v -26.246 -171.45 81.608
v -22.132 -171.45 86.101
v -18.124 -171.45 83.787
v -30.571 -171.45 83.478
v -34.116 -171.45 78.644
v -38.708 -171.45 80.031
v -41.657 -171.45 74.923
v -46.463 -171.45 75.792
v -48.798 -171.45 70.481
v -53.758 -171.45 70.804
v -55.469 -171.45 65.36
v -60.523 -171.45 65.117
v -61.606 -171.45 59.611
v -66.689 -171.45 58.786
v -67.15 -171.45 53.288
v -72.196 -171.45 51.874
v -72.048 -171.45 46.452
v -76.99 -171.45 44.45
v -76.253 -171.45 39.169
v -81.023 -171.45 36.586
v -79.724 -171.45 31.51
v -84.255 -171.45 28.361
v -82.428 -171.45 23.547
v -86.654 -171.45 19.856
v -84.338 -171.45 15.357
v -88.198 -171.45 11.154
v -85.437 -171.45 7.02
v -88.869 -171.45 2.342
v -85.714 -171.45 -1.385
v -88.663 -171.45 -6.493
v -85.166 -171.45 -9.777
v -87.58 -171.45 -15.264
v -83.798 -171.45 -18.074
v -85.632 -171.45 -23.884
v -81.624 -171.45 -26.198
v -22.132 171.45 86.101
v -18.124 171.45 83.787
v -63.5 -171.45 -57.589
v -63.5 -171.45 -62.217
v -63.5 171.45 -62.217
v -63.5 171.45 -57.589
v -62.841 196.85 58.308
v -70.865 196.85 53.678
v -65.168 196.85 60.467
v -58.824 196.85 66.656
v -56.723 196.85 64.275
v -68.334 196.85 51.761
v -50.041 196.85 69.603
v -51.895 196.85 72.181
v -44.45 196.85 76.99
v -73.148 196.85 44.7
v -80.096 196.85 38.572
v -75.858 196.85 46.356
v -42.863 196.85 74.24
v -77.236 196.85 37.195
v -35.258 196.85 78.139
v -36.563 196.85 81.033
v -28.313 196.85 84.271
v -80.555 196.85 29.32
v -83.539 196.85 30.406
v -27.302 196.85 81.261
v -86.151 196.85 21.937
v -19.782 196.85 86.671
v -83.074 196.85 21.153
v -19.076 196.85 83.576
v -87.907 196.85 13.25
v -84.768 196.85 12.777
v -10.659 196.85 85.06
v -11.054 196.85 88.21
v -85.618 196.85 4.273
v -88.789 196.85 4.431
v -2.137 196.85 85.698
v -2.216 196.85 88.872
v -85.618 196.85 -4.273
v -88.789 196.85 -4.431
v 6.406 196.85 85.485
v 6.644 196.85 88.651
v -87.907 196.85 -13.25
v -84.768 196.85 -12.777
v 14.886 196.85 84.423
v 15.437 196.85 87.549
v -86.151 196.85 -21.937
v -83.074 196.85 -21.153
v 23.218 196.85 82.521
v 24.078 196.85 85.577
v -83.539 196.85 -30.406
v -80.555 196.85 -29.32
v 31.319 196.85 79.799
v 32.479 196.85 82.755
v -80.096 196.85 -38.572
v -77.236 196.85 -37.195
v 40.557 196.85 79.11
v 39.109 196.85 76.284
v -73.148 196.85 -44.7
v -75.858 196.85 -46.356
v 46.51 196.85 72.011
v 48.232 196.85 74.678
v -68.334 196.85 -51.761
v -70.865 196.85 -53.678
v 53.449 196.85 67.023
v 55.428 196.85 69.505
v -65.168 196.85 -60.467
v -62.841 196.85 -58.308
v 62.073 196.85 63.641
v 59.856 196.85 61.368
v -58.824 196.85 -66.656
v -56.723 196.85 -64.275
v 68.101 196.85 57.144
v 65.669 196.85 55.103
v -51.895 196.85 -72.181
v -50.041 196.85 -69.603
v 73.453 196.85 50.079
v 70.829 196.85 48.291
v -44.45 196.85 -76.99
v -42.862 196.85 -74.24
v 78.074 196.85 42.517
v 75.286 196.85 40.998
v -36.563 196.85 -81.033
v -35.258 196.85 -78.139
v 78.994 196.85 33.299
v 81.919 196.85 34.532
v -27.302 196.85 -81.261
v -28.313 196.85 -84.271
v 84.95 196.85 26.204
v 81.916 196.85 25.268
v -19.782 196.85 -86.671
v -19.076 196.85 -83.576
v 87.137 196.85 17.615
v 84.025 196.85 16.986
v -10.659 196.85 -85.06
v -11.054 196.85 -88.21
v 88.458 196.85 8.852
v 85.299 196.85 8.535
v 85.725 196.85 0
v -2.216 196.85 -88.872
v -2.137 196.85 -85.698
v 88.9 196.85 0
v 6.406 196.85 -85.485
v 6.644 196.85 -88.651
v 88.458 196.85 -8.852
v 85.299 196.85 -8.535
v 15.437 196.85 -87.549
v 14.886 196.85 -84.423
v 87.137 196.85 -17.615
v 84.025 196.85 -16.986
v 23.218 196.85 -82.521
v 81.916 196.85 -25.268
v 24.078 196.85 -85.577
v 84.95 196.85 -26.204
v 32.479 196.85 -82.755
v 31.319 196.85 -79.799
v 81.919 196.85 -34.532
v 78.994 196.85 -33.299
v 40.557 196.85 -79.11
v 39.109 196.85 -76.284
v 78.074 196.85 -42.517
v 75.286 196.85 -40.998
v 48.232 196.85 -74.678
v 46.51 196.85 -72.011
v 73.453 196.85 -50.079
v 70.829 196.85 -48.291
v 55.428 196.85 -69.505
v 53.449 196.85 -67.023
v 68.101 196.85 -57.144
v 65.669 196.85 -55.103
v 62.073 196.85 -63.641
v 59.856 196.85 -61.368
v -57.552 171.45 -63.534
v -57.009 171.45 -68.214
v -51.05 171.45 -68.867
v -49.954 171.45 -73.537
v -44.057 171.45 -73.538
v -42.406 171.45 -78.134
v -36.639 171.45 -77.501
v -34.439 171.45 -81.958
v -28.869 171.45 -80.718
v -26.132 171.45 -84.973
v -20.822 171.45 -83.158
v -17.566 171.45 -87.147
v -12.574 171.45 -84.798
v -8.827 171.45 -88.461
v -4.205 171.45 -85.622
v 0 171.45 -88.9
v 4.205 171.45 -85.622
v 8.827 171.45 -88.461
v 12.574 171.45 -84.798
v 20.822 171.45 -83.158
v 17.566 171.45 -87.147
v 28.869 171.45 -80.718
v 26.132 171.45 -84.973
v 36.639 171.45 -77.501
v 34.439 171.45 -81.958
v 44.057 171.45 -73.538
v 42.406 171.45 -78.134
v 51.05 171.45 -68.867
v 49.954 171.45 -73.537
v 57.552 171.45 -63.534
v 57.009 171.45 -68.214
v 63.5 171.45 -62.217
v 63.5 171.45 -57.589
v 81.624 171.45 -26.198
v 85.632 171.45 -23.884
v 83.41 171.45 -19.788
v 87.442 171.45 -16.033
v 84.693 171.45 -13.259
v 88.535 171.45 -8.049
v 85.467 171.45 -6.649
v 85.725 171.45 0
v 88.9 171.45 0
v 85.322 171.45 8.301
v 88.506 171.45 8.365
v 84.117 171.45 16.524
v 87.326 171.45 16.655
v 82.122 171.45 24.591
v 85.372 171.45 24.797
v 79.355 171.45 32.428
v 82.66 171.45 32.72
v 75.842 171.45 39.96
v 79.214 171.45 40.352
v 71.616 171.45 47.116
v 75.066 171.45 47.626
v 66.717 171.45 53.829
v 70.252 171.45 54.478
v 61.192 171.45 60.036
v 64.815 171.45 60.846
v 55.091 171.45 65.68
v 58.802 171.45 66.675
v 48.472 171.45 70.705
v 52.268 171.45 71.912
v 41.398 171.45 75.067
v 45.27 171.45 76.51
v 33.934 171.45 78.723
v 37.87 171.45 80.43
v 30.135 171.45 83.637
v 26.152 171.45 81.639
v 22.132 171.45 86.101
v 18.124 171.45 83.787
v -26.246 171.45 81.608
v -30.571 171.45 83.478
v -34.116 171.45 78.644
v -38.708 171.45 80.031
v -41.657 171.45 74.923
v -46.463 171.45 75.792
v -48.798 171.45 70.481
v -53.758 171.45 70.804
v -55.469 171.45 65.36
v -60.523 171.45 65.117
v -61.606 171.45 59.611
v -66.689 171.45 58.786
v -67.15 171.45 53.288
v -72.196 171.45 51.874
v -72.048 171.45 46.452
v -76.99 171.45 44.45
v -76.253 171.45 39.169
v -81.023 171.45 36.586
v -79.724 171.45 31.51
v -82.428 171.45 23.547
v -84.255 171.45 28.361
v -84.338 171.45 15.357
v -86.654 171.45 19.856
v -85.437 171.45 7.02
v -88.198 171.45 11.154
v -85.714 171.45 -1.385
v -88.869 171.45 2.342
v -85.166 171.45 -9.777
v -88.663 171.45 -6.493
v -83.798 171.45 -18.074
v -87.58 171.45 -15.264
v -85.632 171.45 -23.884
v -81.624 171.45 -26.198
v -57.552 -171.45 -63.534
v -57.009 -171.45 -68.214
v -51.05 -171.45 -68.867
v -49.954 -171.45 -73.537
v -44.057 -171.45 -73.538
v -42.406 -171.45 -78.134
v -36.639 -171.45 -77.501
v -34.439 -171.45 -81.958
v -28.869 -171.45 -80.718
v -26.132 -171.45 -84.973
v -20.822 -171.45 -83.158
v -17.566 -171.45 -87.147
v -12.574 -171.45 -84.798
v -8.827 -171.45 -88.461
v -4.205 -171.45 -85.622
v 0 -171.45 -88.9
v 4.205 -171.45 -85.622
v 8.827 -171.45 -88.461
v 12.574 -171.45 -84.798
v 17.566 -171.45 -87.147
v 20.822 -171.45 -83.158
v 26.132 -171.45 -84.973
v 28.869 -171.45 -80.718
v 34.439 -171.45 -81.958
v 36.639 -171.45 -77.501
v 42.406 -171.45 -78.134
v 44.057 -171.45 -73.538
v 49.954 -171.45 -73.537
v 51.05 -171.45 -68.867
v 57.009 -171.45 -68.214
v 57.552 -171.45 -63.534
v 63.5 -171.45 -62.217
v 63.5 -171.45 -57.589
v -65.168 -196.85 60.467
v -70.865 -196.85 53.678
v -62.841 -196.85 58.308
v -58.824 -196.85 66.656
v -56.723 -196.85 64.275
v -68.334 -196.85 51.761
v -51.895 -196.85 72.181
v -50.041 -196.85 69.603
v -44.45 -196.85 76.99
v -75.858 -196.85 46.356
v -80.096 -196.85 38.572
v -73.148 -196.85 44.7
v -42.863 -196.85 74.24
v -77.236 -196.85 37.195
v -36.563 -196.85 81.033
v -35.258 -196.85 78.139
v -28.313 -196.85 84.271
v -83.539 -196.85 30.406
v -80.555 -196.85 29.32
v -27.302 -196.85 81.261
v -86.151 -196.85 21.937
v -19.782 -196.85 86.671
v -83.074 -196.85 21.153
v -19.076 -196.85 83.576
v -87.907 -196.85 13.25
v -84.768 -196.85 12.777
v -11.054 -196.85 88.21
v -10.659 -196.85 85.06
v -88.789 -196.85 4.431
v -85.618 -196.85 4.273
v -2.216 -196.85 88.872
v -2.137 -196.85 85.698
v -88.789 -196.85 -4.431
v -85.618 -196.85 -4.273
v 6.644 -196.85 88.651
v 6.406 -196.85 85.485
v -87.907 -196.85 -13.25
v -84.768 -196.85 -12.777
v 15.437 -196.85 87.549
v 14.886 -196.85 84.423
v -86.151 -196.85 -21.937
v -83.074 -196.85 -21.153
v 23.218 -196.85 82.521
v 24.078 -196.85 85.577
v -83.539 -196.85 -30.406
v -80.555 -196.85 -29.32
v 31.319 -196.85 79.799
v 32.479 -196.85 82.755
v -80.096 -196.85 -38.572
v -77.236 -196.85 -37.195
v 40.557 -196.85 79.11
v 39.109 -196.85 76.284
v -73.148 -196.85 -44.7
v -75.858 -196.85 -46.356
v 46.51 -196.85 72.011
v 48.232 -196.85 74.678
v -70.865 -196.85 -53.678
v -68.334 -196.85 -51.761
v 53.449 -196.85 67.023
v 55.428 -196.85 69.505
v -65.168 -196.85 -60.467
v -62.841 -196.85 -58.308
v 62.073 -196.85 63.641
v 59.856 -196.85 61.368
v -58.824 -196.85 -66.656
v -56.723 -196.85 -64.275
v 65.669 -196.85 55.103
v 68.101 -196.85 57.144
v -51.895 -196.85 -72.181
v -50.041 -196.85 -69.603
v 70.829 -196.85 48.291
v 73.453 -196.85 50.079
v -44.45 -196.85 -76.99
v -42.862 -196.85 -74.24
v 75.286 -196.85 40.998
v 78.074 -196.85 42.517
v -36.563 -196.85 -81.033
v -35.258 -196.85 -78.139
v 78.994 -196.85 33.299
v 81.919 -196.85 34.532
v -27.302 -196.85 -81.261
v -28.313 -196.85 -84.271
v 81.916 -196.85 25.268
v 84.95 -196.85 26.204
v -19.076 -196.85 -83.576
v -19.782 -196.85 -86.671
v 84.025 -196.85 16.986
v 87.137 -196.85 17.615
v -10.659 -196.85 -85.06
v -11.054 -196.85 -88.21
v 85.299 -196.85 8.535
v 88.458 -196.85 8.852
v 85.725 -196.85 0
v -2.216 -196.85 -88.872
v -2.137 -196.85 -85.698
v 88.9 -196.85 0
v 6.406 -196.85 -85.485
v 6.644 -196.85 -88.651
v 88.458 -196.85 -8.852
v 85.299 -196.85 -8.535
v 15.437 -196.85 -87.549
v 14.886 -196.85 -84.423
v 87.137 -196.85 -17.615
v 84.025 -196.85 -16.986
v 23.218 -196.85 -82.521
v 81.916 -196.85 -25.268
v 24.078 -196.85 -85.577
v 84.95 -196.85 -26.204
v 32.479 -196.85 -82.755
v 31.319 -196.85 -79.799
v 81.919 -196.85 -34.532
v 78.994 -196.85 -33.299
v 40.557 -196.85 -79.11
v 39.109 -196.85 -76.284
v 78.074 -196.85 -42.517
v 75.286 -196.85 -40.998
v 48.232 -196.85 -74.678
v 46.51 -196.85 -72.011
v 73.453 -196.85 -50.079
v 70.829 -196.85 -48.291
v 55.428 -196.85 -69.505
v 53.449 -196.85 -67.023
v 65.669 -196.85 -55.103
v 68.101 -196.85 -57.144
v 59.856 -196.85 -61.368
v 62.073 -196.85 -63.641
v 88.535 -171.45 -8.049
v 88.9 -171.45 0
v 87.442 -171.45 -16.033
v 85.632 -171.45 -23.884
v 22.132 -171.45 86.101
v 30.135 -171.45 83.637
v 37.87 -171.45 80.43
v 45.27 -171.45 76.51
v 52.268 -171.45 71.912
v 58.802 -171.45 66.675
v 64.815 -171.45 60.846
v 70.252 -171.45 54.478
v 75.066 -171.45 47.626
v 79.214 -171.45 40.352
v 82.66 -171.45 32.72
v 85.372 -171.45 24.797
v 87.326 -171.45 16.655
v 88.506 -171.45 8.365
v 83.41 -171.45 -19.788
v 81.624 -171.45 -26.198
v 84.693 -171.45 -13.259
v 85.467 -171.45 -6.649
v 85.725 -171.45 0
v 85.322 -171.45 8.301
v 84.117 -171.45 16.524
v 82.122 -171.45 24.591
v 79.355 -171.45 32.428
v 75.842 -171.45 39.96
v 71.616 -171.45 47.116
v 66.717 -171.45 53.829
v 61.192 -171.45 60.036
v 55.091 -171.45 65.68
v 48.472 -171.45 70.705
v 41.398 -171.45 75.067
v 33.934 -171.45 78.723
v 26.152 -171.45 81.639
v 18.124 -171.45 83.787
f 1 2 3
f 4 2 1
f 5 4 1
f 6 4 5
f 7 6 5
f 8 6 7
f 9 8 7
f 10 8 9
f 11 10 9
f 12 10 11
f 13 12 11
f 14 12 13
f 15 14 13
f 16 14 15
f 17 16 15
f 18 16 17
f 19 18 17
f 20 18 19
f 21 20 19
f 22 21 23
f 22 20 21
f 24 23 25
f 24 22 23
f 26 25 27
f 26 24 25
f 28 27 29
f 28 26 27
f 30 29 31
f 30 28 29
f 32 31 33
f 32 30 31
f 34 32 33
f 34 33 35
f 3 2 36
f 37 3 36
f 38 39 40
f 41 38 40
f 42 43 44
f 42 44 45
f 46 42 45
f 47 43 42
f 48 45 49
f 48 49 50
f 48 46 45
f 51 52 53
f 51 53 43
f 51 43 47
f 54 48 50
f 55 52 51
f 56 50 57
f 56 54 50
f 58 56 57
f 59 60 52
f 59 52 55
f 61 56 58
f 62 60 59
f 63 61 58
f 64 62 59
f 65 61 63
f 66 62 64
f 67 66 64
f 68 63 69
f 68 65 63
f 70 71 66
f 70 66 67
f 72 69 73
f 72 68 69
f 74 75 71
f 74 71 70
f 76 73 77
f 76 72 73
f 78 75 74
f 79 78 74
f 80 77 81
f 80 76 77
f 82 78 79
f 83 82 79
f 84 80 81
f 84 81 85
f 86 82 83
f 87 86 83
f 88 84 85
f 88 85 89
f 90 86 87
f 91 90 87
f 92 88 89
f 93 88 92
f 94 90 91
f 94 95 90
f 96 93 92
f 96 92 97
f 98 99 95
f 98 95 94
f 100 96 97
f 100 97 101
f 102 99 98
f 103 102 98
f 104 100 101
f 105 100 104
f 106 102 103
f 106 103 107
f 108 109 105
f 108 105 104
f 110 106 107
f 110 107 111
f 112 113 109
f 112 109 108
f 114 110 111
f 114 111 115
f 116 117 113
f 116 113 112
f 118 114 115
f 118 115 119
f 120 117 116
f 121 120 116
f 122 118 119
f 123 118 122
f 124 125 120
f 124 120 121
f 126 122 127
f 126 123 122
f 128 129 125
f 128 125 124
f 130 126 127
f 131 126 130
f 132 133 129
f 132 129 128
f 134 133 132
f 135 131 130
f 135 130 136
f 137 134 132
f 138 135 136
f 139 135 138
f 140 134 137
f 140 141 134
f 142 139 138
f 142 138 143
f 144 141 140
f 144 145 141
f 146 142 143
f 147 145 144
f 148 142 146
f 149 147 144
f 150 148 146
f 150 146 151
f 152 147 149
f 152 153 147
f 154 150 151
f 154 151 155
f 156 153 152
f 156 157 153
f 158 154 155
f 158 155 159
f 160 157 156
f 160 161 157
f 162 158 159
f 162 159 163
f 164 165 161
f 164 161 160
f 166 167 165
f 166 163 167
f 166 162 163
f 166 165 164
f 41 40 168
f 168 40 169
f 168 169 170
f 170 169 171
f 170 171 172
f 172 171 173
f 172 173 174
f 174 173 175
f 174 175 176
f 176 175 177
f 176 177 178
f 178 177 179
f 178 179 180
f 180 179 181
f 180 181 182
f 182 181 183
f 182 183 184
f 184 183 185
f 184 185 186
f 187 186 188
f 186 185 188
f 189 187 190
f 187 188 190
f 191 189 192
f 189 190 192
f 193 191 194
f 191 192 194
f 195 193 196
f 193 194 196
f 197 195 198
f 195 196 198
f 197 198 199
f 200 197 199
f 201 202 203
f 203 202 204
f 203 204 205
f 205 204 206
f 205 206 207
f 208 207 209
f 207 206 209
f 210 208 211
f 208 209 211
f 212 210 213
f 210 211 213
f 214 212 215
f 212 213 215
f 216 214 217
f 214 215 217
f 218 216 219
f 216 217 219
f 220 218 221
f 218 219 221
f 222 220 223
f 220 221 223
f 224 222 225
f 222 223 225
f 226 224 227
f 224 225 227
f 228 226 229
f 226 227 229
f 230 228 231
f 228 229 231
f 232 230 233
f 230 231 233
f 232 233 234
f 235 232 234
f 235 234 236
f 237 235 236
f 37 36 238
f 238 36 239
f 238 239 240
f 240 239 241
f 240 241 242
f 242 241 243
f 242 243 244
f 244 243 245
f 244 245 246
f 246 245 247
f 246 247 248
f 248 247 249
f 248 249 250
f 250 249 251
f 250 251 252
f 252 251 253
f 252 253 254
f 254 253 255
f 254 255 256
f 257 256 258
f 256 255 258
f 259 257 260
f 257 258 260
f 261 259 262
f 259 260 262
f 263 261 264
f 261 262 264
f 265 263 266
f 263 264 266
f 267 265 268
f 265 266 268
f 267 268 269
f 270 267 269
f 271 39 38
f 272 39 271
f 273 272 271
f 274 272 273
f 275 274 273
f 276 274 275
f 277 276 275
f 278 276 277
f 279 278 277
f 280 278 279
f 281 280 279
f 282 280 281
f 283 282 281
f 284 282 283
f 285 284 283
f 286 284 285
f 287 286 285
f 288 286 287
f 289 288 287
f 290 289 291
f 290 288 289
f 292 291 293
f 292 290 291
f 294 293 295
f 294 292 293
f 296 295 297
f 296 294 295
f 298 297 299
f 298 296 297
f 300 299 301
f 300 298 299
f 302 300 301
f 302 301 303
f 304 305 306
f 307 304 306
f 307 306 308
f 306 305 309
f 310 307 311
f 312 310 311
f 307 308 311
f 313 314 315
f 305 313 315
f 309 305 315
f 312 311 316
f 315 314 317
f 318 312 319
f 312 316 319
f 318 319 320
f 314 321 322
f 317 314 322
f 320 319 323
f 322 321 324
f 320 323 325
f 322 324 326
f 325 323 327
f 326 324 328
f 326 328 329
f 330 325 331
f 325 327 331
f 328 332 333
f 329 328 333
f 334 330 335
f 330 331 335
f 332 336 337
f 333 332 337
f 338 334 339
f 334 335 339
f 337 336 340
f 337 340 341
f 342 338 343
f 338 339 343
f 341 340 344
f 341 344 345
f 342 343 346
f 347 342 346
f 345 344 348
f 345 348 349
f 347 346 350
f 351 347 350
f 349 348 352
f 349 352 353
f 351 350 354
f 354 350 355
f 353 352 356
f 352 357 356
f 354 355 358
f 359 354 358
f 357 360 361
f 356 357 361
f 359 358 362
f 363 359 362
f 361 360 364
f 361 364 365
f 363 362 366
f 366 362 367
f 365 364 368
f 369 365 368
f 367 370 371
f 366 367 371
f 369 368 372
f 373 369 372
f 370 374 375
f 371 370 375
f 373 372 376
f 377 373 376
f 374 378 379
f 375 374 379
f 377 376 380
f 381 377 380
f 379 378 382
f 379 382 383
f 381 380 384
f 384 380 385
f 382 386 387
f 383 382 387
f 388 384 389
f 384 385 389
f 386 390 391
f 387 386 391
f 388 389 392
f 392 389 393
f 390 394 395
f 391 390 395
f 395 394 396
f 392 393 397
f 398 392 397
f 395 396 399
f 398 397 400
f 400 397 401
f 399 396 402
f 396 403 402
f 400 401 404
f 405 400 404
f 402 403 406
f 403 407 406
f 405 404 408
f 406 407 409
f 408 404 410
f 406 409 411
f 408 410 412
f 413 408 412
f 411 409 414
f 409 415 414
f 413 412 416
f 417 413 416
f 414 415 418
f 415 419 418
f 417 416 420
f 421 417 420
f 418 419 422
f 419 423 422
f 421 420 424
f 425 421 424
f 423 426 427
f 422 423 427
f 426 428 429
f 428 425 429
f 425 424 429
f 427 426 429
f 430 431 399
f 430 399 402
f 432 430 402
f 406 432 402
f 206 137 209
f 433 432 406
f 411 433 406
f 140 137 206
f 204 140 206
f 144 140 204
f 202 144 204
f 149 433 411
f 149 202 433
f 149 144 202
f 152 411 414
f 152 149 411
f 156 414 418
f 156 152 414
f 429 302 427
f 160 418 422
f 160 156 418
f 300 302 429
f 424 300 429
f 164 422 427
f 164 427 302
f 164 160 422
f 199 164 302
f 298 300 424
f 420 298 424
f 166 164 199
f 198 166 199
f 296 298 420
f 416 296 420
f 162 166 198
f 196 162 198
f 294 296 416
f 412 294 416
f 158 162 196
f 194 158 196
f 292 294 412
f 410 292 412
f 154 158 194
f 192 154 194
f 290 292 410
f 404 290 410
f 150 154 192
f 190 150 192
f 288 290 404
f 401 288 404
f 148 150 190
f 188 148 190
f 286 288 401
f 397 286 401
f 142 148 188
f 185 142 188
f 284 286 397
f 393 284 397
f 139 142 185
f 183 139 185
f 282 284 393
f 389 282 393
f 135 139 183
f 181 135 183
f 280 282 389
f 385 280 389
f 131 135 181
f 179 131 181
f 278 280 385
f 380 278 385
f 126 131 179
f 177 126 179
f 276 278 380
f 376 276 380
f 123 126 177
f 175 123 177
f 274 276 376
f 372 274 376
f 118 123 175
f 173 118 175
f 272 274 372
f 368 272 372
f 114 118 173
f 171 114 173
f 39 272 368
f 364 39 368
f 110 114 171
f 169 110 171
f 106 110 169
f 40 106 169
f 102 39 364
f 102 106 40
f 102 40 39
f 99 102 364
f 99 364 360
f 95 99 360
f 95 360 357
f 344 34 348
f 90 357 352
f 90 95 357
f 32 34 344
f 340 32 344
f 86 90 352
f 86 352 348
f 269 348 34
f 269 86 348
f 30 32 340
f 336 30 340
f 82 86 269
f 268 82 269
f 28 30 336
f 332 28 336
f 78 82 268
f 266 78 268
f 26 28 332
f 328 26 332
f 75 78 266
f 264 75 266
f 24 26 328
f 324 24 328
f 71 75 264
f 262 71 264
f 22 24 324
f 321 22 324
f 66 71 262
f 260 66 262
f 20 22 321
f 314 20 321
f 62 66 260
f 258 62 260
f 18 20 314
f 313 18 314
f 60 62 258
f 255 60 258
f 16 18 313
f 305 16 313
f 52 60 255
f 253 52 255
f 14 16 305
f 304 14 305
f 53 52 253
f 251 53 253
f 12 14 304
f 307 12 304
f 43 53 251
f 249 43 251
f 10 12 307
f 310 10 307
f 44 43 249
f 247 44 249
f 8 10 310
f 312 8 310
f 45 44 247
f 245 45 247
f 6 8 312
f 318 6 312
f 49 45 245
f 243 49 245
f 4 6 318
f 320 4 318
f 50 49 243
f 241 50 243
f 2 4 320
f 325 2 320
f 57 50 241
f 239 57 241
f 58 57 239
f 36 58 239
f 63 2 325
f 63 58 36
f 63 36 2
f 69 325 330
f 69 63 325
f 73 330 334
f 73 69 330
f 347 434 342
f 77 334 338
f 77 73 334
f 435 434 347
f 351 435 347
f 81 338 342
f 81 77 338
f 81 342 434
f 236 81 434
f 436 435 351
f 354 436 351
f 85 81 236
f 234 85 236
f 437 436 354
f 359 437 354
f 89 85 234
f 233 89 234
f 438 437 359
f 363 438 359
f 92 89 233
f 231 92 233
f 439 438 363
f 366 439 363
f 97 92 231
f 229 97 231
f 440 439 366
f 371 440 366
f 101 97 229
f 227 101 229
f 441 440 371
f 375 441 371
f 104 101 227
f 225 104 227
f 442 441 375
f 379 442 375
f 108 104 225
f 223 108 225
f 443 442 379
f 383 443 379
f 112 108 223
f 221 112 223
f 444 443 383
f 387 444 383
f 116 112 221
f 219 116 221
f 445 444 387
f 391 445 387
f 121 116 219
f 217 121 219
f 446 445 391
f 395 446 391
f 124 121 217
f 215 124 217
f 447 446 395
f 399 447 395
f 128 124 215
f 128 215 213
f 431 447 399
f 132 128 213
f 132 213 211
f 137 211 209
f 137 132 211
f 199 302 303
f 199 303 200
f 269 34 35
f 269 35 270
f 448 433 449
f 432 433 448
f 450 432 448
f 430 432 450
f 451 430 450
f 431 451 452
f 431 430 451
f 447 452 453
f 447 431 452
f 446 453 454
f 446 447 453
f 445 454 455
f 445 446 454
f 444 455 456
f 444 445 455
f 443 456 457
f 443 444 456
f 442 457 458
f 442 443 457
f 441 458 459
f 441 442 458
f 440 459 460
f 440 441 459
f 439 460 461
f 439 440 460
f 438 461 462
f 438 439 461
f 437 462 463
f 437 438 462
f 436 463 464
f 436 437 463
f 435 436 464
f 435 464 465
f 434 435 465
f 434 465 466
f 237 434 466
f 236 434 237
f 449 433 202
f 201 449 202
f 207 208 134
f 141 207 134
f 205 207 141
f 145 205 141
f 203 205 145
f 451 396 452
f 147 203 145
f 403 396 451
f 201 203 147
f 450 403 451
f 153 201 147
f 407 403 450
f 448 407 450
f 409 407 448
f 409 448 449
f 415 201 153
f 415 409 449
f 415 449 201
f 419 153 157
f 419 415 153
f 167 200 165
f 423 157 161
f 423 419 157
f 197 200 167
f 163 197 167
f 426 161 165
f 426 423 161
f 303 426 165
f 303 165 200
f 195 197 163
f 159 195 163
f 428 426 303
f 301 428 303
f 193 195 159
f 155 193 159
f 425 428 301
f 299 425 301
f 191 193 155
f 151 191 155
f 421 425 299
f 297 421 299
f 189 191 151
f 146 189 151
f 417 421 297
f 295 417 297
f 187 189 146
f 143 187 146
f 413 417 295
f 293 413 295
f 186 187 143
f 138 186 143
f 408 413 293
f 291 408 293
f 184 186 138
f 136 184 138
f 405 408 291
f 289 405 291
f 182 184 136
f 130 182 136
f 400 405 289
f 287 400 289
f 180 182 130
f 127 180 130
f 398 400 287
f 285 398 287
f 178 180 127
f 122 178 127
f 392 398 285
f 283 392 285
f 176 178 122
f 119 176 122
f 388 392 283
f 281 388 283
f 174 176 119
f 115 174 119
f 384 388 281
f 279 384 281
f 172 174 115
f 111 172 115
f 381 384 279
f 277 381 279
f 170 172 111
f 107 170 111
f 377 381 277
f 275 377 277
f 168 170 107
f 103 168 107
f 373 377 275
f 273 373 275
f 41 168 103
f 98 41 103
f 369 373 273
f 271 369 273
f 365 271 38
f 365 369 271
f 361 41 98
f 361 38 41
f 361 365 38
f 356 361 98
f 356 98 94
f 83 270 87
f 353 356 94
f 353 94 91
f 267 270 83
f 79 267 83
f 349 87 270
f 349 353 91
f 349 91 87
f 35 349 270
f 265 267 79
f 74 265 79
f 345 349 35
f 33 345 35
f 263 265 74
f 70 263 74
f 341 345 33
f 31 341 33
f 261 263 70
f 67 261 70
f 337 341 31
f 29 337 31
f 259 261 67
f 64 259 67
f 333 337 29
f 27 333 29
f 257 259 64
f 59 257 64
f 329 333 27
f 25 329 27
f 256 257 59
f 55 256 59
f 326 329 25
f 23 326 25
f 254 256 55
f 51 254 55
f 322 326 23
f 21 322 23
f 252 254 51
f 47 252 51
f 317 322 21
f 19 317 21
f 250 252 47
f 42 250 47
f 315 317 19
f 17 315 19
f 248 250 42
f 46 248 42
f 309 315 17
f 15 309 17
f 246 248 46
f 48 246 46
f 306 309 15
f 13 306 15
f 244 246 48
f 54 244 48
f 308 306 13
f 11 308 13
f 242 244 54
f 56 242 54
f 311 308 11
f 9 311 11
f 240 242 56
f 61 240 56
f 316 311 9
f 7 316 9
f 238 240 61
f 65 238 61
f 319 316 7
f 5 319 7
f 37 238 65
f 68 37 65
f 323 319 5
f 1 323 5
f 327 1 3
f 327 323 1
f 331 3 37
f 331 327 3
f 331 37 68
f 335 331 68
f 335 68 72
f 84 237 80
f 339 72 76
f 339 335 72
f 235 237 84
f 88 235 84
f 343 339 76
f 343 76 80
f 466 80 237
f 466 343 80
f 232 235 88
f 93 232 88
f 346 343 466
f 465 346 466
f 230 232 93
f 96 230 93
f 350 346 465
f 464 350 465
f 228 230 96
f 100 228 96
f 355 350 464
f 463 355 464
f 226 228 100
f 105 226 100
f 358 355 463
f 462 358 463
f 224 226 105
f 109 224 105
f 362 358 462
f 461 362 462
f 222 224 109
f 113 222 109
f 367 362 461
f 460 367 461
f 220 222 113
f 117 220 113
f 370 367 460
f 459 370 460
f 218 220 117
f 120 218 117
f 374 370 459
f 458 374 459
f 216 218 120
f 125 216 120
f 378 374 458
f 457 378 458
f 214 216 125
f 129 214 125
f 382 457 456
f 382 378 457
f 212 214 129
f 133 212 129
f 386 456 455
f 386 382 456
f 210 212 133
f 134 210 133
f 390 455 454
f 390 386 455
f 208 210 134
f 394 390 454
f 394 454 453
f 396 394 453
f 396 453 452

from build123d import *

# Parameters (mm, degrees)
SKETCH1_R           = 88.9
SKETCH1_R_2         = 85.725
BOSS_EXTRUDE1_DEPTH = 196.85
CUT_EXTRUDE1_START  = -88.9
SKETCH2_W           = 127
SKETCH2_H           = 342.9
CUT_EXTRUDE1_DEPTH  = 31.310716
CIRPATTERN1_COUNT   = 3


with BuildPart() as part:
    # Sketch1 → Boss-Extrude1 (new body, symmetric)
    with BuildSketch(Plane(origin=(0, 0, 0), x_dir=(1, 0, 0), z_dir=(0, 1, 0))):
        Circle(SKETCH1_R)
        Circle(SKETCH1_R_2, mode=Mode.SUBTRACT)
    extrude(amount=BOSS_EXTRUDE1_DEPTH, both=True)

    # Sketch2 → Cut-Extrude1 (cut)
    with BuildSketch(Plane.XY.offset(CUT_EXTRUDE1_START)):
        Rectangle(SKETCH2_W, SKETCH2_H)
    cut_extrude1 = extrude(amount=CUT_EXTRUDE1_DEPTH, mode=Mode.SUBTRACT)

    # CirPattern1: Cut-Extrude1 ×3 about axis
    cirpattern1_axis = Axis((0, 0, 0), (0, 1, 0))
    for i in range(1, CIRPATTERN1_COUNT):
        add(cut_extrude1.rotate(cirpattern1_axis, i * 360 / CIRPATTERN1_COUNT), mode=Mode.SUBTRACT)


solid = part.part
